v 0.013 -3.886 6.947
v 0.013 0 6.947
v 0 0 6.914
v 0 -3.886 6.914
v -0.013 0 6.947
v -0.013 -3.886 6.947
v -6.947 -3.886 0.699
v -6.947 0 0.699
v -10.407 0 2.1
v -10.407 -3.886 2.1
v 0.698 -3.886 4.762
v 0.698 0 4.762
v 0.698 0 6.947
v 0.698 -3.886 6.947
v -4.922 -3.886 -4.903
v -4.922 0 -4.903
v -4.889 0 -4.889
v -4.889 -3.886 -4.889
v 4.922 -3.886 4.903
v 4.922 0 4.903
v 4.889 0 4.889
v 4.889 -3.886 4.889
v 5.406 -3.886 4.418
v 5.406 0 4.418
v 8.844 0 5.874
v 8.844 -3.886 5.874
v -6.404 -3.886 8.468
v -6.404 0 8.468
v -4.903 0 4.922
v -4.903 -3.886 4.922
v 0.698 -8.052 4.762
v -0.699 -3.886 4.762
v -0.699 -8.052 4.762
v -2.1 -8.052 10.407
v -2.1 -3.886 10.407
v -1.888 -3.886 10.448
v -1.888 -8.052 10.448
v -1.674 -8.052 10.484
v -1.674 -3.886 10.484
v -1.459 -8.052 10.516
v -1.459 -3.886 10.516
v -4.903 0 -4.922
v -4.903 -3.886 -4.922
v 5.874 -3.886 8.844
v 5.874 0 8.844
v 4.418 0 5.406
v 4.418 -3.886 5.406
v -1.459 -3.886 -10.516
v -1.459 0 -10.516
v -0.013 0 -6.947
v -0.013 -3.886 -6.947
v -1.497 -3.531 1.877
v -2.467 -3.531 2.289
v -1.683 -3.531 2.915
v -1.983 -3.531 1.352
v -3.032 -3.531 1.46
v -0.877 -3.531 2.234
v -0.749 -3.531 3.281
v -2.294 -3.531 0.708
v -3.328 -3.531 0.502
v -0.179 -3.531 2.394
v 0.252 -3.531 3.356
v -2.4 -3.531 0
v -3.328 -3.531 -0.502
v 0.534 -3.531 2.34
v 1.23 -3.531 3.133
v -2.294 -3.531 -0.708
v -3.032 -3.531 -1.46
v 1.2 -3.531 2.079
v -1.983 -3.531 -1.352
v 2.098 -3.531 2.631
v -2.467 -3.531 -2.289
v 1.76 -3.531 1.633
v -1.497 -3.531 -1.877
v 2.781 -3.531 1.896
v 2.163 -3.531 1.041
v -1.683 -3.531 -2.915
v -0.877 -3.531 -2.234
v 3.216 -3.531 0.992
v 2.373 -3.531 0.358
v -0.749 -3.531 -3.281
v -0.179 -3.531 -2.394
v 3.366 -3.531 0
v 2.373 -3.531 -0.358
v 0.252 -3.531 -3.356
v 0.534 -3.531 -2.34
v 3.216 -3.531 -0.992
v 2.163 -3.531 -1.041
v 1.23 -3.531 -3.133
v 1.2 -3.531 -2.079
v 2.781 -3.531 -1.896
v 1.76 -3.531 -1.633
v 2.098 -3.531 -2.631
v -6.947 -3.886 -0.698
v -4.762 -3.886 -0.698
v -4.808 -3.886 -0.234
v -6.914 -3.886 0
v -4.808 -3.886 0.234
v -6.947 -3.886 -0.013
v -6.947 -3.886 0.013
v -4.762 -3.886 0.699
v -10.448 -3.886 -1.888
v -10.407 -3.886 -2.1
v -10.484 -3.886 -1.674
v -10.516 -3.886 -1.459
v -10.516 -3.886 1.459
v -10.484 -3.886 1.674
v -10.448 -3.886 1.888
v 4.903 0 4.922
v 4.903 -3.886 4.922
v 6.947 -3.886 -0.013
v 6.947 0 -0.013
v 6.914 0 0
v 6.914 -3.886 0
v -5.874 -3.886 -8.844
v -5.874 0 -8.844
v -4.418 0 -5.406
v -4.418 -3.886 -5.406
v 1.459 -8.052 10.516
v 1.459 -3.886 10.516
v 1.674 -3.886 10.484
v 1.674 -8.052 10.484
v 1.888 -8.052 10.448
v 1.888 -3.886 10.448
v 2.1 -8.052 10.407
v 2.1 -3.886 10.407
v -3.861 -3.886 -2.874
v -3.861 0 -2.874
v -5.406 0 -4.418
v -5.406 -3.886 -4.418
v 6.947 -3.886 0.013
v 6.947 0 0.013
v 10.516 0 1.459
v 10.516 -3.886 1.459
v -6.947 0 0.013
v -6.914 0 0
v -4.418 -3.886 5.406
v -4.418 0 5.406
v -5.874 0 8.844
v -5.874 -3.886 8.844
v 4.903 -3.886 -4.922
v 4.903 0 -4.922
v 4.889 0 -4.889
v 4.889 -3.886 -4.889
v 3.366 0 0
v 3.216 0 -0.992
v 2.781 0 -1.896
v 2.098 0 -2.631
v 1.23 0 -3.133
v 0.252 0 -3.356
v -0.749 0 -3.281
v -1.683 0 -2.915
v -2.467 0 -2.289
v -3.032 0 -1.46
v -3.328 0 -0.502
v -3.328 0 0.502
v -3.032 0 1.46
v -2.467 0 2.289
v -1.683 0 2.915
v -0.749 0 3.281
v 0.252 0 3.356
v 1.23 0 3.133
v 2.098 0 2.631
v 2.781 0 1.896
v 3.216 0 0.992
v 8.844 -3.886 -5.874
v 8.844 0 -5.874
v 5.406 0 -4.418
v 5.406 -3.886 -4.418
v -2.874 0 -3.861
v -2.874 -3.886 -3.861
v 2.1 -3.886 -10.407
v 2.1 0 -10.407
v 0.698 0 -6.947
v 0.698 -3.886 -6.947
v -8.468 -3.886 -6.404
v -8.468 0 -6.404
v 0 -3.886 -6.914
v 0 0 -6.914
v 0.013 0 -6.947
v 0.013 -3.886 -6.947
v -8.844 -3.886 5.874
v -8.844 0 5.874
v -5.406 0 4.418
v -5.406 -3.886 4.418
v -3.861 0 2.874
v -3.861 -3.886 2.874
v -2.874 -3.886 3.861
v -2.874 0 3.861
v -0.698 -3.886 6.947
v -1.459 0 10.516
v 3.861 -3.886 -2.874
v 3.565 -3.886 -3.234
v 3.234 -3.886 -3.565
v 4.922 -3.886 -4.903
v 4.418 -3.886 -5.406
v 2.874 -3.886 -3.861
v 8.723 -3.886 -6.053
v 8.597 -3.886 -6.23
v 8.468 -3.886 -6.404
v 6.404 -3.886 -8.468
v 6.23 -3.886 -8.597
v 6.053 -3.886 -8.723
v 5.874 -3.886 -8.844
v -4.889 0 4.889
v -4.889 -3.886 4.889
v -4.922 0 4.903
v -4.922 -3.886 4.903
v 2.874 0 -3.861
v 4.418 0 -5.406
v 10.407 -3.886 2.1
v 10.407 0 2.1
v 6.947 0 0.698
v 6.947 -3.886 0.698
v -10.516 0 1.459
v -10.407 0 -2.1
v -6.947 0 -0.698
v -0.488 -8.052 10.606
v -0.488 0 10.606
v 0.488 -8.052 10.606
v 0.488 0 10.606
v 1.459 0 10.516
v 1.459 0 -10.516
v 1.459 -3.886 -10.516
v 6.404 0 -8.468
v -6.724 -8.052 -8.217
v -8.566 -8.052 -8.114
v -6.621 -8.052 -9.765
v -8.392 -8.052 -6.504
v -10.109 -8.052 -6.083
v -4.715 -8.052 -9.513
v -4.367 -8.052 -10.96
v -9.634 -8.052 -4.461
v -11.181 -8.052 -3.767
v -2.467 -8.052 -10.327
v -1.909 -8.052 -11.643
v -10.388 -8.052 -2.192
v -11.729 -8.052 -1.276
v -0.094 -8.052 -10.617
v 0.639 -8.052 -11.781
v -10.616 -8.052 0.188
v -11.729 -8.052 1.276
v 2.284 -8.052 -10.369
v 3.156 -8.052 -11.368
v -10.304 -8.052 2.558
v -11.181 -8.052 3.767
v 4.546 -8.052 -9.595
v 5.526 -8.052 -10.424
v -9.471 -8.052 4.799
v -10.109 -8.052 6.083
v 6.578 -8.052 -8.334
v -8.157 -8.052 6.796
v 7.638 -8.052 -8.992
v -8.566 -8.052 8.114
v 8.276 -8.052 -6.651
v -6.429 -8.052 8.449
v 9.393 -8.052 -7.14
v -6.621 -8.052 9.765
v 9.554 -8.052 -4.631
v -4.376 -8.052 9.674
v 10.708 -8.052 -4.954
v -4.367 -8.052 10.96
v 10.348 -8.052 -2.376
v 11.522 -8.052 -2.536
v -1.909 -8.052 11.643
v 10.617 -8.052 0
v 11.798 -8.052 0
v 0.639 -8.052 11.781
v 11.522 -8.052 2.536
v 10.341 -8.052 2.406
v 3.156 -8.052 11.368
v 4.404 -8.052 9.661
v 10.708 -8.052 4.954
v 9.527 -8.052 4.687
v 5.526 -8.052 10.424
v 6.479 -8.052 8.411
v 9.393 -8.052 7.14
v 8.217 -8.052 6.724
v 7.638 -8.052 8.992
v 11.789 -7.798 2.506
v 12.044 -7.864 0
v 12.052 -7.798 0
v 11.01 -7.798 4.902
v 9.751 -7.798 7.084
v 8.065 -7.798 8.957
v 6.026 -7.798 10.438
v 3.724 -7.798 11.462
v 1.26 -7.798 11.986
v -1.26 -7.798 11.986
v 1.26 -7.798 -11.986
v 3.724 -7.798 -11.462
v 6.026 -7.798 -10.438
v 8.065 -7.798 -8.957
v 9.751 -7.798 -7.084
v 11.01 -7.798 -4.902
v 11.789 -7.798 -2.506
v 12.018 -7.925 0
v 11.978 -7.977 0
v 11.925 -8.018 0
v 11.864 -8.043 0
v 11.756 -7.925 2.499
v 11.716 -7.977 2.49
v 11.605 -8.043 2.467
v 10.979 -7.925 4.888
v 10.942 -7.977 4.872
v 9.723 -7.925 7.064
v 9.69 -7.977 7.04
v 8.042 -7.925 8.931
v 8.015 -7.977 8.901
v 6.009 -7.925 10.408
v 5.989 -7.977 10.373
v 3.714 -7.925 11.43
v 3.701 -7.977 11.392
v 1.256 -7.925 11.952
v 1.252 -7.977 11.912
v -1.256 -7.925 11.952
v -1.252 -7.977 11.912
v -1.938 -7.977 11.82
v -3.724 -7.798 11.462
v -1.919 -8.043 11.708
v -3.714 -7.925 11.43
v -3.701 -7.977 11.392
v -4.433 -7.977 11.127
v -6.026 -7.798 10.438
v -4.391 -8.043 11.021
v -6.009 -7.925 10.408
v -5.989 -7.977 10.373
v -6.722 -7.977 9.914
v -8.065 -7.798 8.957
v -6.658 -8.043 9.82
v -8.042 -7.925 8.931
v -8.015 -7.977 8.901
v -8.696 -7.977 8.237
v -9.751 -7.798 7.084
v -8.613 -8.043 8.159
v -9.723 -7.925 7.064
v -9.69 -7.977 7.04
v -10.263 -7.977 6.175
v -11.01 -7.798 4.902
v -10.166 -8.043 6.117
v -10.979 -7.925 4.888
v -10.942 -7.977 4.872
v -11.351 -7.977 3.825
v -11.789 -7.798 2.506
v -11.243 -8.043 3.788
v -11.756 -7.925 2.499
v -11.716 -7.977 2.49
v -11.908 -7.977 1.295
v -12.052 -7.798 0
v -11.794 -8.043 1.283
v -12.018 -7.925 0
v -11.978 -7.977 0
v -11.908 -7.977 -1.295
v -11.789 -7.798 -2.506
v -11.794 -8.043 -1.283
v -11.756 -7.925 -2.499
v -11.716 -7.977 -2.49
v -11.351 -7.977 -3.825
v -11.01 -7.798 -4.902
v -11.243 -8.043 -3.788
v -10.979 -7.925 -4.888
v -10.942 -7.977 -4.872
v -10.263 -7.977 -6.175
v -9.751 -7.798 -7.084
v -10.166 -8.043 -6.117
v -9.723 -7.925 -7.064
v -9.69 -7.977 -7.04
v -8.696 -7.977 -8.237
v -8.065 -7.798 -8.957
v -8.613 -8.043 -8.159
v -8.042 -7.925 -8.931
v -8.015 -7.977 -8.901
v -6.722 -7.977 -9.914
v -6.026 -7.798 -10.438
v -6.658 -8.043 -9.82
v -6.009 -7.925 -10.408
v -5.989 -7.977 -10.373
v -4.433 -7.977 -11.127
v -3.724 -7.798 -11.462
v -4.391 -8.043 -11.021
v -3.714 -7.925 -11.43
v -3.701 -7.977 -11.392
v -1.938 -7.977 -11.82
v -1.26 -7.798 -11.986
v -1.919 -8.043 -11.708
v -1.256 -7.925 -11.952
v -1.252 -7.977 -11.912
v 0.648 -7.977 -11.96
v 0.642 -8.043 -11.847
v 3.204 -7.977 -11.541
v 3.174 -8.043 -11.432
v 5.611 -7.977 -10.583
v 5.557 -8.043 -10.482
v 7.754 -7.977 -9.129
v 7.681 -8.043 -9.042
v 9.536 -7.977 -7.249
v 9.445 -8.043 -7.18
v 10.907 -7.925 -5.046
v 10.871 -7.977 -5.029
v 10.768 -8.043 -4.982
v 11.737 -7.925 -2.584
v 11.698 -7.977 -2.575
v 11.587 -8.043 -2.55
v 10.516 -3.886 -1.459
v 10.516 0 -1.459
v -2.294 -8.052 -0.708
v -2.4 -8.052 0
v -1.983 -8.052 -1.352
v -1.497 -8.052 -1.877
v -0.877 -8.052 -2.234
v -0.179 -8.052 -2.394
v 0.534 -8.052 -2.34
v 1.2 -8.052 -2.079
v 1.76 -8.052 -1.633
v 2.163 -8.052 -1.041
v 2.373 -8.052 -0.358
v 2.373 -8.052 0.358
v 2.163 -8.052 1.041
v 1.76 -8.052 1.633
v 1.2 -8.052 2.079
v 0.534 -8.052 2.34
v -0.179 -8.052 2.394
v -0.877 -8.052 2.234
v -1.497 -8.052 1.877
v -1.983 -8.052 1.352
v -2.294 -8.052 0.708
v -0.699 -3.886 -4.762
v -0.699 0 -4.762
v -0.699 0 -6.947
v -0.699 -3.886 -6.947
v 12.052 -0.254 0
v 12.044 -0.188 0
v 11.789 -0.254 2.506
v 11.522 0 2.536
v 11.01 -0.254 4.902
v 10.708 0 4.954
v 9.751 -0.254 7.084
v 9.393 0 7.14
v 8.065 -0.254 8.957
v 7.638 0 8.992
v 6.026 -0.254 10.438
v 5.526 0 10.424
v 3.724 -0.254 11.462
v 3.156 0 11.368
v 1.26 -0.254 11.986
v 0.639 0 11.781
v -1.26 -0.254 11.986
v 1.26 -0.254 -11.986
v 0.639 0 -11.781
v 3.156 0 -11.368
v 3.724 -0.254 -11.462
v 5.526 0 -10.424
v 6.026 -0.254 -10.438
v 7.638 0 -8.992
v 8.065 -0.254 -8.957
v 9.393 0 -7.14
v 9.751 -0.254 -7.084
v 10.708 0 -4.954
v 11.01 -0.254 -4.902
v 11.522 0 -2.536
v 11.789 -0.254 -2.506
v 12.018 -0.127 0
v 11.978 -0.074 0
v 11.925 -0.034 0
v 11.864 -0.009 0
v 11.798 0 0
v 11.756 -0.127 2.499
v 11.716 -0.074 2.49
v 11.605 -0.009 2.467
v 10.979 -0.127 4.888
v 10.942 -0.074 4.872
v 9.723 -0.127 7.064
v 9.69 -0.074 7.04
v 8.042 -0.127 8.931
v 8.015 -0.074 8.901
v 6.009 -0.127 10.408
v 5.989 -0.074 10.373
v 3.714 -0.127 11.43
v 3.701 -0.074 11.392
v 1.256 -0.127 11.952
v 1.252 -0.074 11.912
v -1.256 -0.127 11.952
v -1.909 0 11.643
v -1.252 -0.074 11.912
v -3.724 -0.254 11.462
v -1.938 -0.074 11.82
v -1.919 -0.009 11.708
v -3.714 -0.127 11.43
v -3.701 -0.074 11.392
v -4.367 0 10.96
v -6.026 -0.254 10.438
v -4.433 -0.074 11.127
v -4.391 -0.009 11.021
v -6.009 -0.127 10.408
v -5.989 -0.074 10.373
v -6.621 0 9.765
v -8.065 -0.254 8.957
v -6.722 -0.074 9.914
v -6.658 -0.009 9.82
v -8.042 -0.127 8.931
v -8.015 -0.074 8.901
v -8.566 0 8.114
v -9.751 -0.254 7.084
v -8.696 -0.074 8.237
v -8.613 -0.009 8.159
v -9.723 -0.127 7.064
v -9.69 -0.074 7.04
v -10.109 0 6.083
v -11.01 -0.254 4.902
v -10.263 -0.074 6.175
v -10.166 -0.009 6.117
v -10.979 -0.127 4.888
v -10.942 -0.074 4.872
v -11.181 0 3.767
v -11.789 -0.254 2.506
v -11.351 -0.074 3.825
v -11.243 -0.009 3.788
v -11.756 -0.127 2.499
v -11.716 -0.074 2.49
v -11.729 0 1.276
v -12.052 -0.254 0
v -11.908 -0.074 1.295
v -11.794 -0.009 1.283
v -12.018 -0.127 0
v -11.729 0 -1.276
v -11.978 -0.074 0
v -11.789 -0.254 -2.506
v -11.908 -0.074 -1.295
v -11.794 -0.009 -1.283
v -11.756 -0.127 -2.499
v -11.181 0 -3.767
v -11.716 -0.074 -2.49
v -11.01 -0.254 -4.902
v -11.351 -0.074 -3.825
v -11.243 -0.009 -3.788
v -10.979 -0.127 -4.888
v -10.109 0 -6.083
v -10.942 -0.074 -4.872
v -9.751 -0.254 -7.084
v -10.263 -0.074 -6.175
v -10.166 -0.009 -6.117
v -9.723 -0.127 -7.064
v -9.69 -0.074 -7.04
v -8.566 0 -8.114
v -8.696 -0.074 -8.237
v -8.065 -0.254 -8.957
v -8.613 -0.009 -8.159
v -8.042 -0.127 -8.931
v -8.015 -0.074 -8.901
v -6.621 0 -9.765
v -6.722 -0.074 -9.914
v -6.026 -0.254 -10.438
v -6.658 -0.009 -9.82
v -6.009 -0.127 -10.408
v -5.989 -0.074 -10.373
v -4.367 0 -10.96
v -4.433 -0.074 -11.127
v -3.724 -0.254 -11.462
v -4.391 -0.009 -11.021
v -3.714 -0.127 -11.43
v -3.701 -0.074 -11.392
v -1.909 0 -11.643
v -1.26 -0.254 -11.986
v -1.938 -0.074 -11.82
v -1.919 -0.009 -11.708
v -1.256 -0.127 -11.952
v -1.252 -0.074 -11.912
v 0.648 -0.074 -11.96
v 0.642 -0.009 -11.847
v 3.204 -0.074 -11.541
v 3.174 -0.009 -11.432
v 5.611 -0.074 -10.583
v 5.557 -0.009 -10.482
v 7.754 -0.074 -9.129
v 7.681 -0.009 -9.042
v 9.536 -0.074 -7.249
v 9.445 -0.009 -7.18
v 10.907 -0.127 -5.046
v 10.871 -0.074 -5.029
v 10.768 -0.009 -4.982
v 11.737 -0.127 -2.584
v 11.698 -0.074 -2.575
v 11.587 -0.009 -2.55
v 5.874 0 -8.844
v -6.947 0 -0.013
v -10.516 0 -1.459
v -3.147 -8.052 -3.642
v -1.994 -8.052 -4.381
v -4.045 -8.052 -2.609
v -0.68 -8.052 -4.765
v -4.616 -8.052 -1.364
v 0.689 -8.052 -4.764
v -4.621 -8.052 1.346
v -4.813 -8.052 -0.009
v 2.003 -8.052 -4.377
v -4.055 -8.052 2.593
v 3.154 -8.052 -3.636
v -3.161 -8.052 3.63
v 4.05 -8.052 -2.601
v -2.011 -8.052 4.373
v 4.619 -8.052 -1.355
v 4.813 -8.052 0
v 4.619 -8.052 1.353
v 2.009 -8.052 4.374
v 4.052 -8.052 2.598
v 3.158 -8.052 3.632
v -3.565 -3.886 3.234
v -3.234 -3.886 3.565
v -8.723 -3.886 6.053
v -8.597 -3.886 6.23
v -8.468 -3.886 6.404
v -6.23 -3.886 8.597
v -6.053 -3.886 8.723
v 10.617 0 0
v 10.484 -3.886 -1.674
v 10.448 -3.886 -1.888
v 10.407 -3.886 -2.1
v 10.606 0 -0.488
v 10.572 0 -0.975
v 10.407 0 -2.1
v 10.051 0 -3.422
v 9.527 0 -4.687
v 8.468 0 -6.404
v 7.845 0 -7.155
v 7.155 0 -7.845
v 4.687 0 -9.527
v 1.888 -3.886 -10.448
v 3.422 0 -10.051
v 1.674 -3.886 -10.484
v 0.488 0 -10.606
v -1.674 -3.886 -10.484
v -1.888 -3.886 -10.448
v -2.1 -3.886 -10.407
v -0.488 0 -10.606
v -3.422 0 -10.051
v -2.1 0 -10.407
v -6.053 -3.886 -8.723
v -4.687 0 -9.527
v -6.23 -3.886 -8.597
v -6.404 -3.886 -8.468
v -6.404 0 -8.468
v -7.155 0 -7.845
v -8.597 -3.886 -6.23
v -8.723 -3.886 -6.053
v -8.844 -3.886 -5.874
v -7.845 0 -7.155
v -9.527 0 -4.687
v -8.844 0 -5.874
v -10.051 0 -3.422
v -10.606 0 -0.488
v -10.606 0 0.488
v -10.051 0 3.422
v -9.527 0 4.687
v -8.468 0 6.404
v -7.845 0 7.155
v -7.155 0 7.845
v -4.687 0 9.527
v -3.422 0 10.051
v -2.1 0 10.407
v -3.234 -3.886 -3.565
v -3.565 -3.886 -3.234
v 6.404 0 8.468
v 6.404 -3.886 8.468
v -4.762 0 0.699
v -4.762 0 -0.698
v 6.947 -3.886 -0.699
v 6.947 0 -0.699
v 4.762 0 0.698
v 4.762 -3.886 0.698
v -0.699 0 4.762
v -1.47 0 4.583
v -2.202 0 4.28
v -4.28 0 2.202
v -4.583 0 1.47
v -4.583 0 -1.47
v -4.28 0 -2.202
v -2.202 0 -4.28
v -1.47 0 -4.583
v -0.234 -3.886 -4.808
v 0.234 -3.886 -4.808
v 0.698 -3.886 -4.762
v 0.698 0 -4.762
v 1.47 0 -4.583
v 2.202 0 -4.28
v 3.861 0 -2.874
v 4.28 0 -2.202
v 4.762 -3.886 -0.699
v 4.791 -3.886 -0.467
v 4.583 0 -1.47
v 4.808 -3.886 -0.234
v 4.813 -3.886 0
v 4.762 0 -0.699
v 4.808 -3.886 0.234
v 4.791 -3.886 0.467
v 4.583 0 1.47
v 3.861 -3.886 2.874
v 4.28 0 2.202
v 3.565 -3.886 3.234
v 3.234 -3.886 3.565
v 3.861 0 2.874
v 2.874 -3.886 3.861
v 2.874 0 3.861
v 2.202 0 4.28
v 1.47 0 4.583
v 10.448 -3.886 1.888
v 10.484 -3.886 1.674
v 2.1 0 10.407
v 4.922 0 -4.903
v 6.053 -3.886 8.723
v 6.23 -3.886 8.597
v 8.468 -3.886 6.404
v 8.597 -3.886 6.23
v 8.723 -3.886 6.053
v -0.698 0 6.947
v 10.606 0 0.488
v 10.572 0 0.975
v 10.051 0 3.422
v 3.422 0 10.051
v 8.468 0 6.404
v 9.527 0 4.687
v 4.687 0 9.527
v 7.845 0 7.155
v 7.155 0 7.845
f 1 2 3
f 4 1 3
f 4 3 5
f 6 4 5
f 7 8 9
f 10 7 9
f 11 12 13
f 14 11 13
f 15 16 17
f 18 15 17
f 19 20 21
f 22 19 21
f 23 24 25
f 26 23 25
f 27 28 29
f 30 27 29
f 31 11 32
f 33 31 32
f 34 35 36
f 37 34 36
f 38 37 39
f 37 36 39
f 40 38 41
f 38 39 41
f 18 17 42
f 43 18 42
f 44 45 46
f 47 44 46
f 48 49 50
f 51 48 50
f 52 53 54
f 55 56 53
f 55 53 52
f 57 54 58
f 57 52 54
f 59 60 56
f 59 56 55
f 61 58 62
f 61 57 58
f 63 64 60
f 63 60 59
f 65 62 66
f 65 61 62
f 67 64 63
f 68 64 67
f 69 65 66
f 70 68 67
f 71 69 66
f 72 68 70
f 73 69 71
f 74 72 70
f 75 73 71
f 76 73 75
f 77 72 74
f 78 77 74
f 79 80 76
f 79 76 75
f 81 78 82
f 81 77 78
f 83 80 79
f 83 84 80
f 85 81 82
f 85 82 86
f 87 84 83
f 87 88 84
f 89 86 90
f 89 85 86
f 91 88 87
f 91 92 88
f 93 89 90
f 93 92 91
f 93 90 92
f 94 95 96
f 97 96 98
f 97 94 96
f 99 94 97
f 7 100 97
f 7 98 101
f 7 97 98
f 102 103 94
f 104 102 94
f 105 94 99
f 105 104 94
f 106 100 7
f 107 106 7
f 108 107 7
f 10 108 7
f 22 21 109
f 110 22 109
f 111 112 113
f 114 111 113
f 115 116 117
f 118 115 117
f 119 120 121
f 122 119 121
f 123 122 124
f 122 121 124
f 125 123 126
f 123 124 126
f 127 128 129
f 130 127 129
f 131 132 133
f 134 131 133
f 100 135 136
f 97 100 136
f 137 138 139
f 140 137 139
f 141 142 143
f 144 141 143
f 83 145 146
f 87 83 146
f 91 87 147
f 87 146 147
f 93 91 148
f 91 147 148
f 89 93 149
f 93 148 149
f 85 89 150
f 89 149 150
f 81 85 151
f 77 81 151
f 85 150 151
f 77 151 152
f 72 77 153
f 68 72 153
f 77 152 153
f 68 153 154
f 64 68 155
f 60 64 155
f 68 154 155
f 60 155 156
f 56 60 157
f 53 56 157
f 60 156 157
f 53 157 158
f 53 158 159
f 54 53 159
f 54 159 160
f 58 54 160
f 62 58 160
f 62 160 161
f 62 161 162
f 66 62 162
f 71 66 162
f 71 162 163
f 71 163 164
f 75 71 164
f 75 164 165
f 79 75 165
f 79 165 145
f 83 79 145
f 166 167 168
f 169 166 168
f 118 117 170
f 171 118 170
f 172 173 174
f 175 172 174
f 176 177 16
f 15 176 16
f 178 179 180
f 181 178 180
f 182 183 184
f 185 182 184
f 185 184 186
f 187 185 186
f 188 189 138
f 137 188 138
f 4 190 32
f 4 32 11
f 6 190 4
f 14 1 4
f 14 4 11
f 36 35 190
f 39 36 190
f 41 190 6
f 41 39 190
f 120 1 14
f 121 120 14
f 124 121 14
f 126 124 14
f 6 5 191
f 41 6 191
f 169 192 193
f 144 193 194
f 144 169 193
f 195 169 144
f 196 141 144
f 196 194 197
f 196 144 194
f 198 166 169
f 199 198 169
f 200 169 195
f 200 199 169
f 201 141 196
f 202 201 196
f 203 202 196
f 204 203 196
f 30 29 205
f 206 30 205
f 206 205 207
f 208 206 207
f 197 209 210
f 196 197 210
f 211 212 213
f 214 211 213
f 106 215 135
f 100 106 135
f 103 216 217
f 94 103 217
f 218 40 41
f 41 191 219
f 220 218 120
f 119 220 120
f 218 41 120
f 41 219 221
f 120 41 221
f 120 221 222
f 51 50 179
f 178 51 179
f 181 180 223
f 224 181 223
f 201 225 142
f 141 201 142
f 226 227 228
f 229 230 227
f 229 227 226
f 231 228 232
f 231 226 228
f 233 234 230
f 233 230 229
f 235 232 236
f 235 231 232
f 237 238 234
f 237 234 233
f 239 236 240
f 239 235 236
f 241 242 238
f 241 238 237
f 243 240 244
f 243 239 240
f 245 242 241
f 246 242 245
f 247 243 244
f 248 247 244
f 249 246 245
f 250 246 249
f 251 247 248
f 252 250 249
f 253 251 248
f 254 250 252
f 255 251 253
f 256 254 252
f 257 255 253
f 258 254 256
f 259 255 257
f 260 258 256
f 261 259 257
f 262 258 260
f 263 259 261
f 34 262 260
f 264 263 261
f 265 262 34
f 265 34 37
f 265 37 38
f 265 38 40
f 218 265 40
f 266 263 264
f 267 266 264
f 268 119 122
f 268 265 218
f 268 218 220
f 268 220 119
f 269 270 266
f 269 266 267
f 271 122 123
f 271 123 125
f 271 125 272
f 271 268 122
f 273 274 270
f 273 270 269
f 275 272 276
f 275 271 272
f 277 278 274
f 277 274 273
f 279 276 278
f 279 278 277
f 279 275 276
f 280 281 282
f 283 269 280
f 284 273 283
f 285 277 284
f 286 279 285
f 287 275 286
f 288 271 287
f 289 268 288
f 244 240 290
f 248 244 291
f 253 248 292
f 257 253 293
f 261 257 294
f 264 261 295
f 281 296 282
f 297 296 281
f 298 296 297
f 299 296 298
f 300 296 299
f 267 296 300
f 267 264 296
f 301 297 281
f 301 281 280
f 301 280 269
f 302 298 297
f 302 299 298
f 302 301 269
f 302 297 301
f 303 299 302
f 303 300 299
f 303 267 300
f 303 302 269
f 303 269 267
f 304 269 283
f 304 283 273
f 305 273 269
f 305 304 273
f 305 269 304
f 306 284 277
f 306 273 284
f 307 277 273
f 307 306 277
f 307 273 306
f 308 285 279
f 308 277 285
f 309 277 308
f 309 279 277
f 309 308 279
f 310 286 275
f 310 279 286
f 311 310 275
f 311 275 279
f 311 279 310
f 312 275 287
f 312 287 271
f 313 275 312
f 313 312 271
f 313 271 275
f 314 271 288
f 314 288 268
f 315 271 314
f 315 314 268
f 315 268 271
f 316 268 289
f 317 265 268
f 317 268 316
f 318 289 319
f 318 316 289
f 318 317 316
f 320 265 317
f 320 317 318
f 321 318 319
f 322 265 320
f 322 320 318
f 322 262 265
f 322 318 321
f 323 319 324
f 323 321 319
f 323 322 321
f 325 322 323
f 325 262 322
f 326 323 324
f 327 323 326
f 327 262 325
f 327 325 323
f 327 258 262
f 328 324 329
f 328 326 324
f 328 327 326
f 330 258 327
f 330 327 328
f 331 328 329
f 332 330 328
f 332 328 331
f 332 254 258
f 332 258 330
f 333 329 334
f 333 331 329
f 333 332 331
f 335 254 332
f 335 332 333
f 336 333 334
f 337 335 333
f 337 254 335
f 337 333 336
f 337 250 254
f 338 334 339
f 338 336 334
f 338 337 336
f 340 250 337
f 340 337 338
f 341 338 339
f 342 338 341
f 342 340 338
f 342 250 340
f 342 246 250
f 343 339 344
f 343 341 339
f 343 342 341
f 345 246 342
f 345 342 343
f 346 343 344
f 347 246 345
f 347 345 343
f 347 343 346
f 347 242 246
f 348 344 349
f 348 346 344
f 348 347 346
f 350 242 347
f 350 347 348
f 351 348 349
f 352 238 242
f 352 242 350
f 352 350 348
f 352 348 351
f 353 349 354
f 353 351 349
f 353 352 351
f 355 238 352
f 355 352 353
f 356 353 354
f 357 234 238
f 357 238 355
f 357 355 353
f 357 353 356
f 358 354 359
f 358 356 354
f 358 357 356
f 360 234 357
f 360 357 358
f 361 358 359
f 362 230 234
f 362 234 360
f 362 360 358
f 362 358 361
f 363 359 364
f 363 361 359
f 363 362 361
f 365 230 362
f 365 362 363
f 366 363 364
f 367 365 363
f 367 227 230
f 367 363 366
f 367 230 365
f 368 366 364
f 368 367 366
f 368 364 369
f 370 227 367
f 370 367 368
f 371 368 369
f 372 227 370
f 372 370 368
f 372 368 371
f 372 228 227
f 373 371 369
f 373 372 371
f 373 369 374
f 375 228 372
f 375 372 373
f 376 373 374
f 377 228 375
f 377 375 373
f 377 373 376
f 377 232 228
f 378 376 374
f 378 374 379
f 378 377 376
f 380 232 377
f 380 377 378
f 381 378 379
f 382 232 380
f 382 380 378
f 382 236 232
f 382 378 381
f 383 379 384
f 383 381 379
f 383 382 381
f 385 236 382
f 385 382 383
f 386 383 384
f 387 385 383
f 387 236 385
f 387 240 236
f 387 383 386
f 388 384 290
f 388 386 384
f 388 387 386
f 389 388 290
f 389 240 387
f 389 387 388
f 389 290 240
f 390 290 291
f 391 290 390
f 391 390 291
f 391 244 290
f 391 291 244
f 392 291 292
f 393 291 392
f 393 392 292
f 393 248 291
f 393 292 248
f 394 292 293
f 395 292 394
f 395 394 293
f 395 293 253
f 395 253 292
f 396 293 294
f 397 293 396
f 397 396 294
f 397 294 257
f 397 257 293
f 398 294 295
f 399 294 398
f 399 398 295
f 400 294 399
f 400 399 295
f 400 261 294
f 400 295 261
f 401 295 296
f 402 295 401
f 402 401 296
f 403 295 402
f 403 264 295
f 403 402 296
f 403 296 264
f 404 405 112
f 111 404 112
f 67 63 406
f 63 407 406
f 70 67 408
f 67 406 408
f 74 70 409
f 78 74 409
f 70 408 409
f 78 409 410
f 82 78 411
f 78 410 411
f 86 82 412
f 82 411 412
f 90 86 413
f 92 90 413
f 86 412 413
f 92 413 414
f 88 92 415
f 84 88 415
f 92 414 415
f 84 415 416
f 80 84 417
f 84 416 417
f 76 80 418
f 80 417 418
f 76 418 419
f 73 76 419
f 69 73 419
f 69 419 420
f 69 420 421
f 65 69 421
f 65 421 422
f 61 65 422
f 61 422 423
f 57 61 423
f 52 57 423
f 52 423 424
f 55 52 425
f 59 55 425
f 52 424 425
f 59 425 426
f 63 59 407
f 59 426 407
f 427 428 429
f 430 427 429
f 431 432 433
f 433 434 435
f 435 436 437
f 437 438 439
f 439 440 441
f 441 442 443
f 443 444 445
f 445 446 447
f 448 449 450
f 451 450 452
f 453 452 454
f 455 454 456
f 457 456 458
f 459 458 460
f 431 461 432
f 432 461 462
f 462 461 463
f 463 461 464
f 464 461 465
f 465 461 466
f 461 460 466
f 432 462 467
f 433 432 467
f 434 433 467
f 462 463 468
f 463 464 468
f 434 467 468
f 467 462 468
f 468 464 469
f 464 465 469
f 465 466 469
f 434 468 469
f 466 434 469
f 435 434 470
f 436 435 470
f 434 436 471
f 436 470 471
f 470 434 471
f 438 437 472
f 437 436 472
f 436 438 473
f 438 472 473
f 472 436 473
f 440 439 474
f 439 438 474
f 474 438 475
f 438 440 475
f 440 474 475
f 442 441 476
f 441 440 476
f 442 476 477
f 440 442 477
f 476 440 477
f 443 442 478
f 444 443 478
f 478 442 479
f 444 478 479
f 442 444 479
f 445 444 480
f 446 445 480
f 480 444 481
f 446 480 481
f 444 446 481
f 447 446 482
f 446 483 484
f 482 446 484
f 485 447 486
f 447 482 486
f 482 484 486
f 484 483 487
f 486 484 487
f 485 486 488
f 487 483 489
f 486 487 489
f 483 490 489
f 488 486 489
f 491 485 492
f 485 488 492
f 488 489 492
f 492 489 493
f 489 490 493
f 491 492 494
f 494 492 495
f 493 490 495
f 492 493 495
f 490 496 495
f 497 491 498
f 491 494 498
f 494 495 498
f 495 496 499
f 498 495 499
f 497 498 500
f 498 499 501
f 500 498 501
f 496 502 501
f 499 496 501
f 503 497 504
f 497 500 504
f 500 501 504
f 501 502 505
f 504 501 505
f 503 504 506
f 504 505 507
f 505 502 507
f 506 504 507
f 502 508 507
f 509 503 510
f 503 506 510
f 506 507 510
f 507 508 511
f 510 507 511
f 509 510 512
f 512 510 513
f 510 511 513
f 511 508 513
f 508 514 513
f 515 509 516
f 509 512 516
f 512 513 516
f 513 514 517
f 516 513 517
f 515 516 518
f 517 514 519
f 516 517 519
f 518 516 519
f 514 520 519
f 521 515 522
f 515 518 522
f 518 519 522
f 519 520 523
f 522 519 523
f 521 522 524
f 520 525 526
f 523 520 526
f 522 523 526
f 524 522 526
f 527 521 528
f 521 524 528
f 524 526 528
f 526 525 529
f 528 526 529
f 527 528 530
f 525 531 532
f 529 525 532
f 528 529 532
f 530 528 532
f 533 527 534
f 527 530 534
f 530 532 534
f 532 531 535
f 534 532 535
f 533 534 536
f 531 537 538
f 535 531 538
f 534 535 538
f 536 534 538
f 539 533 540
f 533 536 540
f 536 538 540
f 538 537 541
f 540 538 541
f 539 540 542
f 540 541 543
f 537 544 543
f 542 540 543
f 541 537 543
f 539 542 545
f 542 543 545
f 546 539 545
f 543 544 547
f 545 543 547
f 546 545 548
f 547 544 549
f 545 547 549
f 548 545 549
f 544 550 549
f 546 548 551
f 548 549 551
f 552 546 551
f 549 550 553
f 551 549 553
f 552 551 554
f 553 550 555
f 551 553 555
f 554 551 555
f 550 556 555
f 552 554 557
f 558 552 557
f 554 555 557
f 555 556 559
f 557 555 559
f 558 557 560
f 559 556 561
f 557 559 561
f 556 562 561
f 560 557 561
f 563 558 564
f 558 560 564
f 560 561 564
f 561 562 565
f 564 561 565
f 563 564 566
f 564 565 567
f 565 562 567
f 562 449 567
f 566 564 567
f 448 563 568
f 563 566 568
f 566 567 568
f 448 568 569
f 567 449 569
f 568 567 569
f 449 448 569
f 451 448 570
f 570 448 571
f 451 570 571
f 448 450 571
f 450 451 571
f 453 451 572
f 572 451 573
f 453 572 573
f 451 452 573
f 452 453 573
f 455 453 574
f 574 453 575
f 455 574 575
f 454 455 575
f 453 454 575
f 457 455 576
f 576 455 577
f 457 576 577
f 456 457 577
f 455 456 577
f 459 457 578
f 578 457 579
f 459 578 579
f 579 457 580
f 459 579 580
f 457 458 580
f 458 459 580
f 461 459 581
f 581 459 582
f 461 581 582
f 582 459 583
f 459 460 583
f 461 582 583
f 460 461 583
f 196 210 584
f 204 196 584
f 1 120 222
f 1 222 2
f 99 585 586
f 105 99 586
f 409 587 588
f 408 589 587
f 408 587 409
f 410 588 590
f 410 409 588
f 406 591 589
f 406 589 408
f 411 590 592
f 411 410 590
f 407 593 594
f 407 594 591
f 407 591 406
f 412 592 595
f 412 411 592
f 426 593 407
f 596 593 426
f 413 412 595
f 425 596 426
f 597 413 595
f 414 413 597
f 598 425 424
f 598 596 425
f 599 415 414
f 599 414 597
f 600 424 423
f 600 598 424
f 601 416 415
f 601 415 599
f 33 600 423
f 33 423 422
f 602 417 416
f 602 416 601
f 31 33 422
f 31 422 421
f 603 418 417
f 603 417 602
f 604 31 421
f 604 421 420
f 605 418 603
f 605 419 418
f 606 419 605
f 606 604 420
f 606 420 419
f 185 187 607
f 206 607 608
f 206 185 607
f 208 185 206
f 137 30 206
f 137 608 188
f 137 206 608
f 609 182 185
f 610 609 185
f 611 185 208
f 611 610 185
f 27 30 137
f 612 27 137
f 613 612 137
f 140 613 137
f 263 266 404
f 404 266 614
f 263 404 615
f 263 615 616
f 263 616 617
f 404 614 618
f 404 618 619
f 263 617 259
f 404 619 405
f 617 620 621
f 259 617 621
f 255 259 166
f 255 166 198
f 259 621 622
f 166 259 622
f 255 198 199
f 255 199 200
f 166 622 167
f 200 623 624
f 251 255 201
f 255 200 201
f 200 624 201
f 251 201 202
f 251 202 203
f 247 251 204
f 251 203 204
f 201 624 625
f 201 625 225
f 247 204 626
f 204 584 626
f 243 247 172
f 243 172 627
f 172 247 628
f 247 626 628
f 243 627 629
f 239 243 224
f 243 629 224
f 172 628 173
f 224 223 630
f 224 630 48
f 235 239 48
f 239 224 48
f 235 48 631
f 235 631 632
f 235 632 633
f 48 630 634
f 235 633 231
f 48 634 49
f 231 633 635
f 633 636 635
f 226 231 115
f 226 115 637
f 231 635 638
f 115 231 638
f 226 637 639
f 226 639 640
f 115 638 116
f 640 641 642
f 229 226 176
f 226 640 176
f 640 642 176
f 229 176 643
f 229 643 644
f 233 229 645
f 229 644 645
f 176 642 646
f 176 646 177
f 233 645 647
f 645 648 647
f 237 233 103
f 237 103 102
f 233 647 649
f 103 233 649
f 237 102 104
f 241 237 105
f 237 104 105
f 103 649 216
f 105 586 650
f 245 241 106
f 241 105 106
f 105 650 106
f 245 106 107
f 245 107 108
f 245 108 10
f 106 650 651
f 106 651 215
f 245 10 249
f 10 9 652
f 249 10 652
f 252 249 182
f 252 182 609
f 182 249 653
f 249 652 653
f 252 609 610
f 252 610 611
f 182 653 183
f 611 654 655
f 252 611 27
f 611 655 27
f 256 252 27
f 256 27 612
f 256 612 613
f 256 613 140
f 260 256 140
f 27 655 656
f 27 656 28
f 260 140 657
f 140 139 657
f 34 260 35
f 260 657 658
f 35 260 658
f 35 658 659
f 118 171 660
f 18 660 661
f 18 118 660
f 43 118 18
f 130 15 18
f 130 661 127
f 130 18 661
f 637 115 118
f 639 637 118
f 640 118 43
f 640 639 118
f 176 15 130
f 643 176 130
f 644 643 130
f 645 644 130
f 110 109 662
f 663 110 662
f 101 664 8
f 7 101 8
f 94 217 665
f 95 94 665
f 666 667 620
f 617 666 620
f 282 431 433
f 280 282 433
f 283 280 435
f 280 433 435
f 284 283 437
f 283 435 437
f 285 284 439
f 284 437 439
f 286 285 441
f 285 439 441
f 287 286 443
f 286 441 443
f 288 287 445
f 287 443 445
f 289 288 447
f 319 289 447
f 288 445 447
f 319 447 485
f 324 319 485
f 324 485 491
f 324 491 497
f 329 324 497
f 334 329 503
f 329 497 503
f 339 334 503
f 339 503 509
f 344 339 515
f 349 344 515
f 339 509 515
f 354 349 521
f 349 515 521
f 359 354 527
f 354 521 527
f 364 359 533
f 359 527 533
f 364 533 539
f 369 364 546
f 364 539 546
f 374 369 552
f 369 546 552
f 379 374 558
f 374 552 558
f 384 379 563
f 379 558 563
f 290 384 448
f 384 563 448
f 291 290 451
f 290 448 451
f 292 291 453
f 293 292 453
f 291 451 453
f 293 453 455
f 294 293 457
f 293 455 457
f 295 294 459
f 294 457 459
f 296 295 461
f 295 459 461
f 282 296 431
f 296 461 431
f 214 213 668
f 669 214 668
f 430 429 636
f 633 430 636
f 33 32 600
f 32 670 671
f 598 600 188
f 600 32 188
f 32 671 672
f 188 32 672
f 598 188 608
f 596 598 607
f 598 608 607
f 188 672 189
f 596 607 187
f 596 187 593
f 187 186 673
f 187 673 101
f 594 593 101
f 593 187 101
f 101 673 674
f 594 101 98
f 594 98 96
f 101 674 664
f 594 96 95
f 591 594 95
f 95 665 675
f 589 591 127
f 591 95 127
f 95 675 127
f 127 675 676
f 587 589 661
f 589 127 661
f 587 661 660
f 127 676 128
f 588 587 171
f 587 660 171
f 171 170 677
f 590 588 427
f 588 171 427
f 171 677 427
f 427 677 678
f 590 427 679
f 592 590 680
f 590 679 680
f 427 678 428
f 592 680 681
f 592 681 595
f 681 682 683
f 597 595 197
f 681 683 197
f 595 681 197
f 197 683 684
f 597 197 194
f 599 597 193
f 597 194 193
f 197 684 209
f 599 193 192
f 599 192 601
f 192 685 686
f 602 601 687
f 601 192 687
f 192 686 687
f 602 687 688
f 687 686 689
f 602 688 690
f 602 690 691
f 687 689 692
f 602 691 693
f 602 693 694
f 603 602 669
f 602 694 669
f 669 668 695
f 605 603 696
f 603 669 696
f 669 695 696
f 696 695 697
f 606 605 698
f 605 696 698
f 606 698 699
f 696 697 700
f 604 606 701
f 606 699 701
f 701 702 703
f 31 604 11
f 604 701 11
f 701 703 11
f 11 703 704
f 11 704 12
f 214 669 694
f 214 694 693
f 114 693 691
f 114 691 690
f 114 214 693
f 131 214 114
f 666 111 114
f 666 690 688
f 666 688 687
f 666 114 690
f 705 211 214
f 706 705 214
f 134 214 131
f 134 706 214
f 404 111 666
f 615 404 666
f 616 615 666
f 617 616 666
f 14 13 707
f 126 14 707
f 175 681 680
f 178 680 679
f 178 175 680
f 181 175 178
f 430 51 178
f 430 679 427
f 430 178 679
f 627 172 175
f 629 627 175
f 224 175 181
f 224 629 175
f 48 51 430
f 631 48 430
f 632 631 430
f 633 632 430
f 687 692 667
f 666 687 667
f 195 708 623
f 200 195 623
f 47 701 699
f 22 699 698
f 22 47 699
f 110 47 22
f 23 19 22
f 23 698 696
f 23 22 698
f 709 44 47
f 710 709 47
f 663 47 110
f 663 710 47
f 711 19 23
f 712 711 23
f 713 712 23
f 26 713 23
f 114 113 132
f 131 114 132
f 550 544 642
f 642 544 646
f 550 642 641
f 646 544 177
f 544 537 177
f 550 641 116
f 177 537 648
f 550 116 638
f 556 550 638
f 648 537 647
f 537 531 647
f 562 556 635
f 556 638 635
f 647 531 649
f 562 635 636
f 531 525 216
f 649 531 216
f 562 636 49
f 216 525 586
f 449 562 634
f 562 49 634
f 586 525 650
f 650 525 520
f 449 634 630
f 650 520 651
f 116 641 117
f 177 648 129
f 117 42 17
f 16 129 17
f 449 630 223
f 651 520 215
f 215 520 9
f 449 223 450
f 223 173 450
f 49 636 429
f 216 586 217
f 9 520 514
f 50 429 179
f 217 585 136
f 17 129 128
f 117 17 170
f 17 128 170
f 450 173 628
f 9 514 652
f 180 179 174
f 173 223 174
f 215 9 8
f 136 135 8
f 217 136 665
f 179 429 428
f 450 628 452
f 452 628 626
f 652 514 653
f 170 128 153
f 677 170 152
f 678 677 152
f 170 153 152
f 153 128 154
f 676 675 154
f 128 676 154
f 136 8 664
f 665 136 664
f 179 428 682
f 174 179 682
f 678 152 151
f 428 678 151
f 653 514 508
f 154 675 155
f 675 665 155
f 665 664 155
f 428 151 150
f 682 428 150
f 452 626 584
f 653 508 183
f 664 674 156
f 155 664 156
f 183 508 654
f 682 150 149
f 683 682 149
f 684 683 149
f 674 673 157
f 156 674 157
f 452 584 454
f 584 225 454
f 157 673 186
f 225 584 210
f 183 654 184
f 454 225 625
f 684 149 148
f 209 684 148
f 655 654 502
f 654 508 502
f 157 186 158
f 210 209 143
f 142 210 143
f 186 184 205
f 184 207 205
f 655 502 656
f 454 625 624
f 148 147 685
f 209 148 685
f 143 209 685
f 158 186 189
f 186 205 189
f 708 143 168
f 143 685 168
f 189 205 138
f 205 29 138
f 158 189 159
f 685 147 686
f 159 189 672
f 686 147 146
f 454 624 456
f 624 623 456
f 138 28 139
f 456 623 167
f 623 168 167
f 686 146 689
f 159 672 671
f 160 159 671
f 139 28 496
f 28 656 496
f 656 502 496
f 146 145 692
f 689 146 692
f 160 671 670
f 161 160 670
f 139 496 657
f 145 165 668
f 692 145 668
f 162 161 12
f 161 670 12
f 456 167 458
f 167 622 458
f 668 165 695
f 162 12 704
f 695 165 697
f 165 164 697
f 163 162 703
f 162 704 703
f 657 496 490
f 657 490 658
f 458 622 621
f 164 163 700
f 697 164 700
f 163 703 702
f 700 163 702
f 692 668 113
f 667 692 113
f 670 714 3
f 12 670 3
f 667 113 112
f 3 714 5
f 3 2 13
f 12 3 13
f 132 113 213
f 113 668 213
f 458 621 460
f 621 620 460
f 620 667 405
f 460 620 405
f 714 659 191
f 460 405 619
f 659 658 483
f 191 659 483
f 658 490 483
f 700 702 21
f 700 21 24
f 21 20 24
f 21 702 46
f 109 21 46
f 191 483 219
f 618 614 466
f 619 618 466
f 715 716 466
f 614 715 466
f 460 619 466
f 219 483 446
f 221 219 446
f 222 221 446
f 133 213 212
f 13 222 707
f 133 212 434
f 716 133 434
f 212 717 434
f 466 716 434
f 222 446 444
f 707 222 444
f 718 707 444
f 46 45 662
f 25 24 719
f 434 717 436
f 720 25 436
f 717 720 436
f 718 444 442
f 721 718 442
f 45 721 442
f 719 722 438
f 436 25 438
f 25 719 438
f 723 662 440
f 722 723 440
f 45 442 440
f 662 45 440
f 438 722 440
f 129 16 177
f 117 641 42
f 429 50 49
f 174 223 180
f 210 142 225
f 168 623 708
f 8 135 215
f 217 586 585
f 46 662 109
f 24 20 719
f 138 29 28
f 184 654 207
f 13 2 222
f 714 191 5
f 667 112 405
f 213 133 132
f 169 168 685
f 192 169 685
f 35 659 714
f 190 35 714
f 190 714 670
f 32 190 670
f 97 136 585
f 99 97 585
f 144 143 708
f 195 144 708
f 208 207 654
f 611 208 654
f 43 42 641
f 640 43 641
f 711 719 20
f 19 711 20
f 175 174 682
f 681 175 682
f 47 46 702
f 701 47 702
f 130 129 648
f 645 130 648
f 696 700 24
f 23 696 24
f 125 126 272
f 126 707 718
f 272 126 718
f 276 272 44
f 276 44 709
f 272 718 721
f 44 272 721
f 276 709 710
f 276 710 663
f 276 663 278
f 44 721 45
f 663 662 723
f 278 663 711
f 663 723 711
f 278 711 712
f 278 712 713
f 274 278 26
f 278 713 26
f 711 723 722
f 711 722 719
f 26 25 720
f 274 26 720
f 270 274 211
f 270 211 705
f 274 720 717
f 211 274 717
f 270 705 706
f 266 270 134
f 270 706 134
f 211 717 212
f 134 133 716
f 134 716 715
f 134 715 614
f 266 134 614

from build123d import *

# Parameters (mm, degrees)
F1_DEPTH       = 3.8862
F2_COUNT       = 8
F0_R           = 12.0523
F3_DEPTH       = 8.0518
F4_D           = 4.8006
F4_CBORE_D     = 6.731
F4_CBORE_DEPTH = 3.5306
F5_R           = 0.254
F6_DEPTH       = 3.8862


with BuildPart() as f1:
    # F0 (on Front) → F1 (new body)
    with BuildSketch(Plane.XZ):
        with BuildLine():
            Line((0.6985, 4.7623475976), (0.6985, 6.9467475976))
            Line((0.6985, 6.9467475976), (0.013371136, 6.9467475976))
            Line((0.013371136, 6.9467475976), (0, 6.9137418223))
            Line((0, 6.9137418223), (-0.013371136, 6.9467475976))
            Line((-0.013371136, 6.9467475976), (-0.6985, 6.9467475976))
            Line((-0.6985, 6.9467475976), (-0.6985, 4.7623475976))
            ThreePointArc((-0.6985, 4.7623475976), (0, 4.8133), (0.6985, 4.7623475976))
        make_face()
        with BuildLine():
            Line((0.6985, 6.9467475976), (2.1004446952, 10.4073564329))
            ThreePointArc((2.1004446952, 10.4073564329), (1.7808041825, 10.4667890159), (1.4594938078, 10.51640688))
            Line((1.4594938078, 10.51640688), (0.013371136, 6.9467475976))
            Line((0.013371136, 6.9467475976), (0.6985, 6.9467475976))
        make_face()
        with BuildLine():
            ThreePointArc((-1.4594938078, 10.51640688), (-1.7808041825, 10.4667890159), (-2.1004446952, 10.4073564329))
            Line((-2.1004446952, 10.4073564329), (-0.6985, 6.9467475976))
            Line((-0.6985, 6.9467475976), (-0.013371136, 6.9467475976))
            Line((-0.013371136, 6.9467475976), (-1.4594938078, 10.51640688))
        make_face()
    extrude(amount=F1_DEPTH)


with BuildPart() as f2_1:
    # F2: instance of F1
    add(f1.part.rotate(Axis((0, 0, 0), (0, -1, 0)), 1 * 360 / F2_COUNT))


with BuildPart() as f2_2:
    # F2: instance of F1
    add(f1.part.rotate(Axis((0, 0, 0), (0, -1, 0)), 2 * 360 / F2_COUNT))


with BuildPart() as f2_3:
    # F2: instance of F1
    add(f1.part.rotate(Axis((0, 0, 0), (0, -1, 0)), 3 * 360 / F2_COUNT))


with BuildPart() as f2_4:
    # F2: instance of F1
    add(f1.part.rotate(Axis((0, 0, 0), (0, -1, 0)), 4 * 360 / F2_COUNT))


with BuildPart() as f2_5:
    # F2: instance of F1
    add(f1.part.rotate(Axis((0, 0, 0), (0, -1, 0)), 5 * 360 / F2_COUNT))


with BuildPart() as f2_6:
    # F2: instance of F1
    add(f1.part.rotate(Axis((0, 0, 0), (0, -1, 0)), 6 * 360 / F2_COUNT))


with BuildPart() as f2_7:
    # F2: instance of F1
    add(f1.part.rotate(Axis((0, 0, 0), (0, -1, 0)), 7 * 360 / F2_COUNT))


with BuildPart() as f1_1:
    add(f1.part)

    add(f2_1.part)  # F3 merges F2_1

    add(f2_2.part)  # F3 merges F2_2

    add(f2_3.part)  # F3 merges F2_3

    add(f2_4.part)  # F3 merges F2_4

    add(f2_5.part)  # F3 merges F2_5

    add(f2_6.part)  # F3 merges F2_6

    add(f2_7.part)  # F3 merges F2_7
    # F0 (on Front) → F3 (join)
    with BuildSketch(Plane.XZ):
        Circle(F0_R)
        with BuildLine():
            ThreePointArc((2.1004446952, 10.4073564329), (8.2166227021, 6.7239904232), (10.6172, 0))
            ThreePointArc((10.6172, 0), (-6.7239904232, -8.2166227021), (-2.1004446952, 10.4073564329))
            ThreePointArc((-2.1004446952, 10.4073564329), (-1.7808041825, 10.4667890159), (-1.4594938078, 10.51640688))
            ThreePointArc((-1.4594938078, 10.51640688), (0, 10.6172), (1.4594938078, 10.51640688))
            ThreePointArc((1.4594938078, 10.51640688), (1.7808041825, 10.4667890159), (2.1004446952, 10.4073564329))
        make_face(mode=Mode.SUBTRACT)
        with BuildLine():
            ThreePointArc((4.8133, 0), (3.6421111282, 3.1468847167), (0.6985, 4.7623475976))
            Line((0.6985, 4.7623475976), (-0.6985, 4.7623475976))
            ThreePointArc((-0.6985, 4.7623475976), (-3.1468847167, -3.6421111282), (4.8133, 0))
        make_face()
    extrude(amount=F3_DEPTH)

    # F4 (through all)
    with Locations(Plane(origin=(0, 0, 0), x_dir=(1, 0, 0), z_dir=(0, 1, 0))):
        with Locations((0, 0)):
            CounterBoreHole(F4_D / 2, F4_CBORE_D / 2, F4_CBORE_DEPTH)

    # F5
    f5_edges = [f1_1.edges().sort_by_distance(p)[0] for p in [
        (-12.0523, -8.0518, 0),
        (-12.0523, 0, 0),
    ]]
    fillet(f5_edges, radius=F5_R)

    # F0 (on Front) → F6 (join, through all)
    with BuildSketch(Plane.XZ):
        with BuildLine():
            Line((-0.6985, 4.7623475976), (0.6985, 4.7623475976))
            ThreePointArc((0.6985, 4.7623475976), (0, 4.8133), (-0.6985, 4.7623475976))
        make_face()
    extrude(amount=F6_DEPTH)


solid = f1_1.part
